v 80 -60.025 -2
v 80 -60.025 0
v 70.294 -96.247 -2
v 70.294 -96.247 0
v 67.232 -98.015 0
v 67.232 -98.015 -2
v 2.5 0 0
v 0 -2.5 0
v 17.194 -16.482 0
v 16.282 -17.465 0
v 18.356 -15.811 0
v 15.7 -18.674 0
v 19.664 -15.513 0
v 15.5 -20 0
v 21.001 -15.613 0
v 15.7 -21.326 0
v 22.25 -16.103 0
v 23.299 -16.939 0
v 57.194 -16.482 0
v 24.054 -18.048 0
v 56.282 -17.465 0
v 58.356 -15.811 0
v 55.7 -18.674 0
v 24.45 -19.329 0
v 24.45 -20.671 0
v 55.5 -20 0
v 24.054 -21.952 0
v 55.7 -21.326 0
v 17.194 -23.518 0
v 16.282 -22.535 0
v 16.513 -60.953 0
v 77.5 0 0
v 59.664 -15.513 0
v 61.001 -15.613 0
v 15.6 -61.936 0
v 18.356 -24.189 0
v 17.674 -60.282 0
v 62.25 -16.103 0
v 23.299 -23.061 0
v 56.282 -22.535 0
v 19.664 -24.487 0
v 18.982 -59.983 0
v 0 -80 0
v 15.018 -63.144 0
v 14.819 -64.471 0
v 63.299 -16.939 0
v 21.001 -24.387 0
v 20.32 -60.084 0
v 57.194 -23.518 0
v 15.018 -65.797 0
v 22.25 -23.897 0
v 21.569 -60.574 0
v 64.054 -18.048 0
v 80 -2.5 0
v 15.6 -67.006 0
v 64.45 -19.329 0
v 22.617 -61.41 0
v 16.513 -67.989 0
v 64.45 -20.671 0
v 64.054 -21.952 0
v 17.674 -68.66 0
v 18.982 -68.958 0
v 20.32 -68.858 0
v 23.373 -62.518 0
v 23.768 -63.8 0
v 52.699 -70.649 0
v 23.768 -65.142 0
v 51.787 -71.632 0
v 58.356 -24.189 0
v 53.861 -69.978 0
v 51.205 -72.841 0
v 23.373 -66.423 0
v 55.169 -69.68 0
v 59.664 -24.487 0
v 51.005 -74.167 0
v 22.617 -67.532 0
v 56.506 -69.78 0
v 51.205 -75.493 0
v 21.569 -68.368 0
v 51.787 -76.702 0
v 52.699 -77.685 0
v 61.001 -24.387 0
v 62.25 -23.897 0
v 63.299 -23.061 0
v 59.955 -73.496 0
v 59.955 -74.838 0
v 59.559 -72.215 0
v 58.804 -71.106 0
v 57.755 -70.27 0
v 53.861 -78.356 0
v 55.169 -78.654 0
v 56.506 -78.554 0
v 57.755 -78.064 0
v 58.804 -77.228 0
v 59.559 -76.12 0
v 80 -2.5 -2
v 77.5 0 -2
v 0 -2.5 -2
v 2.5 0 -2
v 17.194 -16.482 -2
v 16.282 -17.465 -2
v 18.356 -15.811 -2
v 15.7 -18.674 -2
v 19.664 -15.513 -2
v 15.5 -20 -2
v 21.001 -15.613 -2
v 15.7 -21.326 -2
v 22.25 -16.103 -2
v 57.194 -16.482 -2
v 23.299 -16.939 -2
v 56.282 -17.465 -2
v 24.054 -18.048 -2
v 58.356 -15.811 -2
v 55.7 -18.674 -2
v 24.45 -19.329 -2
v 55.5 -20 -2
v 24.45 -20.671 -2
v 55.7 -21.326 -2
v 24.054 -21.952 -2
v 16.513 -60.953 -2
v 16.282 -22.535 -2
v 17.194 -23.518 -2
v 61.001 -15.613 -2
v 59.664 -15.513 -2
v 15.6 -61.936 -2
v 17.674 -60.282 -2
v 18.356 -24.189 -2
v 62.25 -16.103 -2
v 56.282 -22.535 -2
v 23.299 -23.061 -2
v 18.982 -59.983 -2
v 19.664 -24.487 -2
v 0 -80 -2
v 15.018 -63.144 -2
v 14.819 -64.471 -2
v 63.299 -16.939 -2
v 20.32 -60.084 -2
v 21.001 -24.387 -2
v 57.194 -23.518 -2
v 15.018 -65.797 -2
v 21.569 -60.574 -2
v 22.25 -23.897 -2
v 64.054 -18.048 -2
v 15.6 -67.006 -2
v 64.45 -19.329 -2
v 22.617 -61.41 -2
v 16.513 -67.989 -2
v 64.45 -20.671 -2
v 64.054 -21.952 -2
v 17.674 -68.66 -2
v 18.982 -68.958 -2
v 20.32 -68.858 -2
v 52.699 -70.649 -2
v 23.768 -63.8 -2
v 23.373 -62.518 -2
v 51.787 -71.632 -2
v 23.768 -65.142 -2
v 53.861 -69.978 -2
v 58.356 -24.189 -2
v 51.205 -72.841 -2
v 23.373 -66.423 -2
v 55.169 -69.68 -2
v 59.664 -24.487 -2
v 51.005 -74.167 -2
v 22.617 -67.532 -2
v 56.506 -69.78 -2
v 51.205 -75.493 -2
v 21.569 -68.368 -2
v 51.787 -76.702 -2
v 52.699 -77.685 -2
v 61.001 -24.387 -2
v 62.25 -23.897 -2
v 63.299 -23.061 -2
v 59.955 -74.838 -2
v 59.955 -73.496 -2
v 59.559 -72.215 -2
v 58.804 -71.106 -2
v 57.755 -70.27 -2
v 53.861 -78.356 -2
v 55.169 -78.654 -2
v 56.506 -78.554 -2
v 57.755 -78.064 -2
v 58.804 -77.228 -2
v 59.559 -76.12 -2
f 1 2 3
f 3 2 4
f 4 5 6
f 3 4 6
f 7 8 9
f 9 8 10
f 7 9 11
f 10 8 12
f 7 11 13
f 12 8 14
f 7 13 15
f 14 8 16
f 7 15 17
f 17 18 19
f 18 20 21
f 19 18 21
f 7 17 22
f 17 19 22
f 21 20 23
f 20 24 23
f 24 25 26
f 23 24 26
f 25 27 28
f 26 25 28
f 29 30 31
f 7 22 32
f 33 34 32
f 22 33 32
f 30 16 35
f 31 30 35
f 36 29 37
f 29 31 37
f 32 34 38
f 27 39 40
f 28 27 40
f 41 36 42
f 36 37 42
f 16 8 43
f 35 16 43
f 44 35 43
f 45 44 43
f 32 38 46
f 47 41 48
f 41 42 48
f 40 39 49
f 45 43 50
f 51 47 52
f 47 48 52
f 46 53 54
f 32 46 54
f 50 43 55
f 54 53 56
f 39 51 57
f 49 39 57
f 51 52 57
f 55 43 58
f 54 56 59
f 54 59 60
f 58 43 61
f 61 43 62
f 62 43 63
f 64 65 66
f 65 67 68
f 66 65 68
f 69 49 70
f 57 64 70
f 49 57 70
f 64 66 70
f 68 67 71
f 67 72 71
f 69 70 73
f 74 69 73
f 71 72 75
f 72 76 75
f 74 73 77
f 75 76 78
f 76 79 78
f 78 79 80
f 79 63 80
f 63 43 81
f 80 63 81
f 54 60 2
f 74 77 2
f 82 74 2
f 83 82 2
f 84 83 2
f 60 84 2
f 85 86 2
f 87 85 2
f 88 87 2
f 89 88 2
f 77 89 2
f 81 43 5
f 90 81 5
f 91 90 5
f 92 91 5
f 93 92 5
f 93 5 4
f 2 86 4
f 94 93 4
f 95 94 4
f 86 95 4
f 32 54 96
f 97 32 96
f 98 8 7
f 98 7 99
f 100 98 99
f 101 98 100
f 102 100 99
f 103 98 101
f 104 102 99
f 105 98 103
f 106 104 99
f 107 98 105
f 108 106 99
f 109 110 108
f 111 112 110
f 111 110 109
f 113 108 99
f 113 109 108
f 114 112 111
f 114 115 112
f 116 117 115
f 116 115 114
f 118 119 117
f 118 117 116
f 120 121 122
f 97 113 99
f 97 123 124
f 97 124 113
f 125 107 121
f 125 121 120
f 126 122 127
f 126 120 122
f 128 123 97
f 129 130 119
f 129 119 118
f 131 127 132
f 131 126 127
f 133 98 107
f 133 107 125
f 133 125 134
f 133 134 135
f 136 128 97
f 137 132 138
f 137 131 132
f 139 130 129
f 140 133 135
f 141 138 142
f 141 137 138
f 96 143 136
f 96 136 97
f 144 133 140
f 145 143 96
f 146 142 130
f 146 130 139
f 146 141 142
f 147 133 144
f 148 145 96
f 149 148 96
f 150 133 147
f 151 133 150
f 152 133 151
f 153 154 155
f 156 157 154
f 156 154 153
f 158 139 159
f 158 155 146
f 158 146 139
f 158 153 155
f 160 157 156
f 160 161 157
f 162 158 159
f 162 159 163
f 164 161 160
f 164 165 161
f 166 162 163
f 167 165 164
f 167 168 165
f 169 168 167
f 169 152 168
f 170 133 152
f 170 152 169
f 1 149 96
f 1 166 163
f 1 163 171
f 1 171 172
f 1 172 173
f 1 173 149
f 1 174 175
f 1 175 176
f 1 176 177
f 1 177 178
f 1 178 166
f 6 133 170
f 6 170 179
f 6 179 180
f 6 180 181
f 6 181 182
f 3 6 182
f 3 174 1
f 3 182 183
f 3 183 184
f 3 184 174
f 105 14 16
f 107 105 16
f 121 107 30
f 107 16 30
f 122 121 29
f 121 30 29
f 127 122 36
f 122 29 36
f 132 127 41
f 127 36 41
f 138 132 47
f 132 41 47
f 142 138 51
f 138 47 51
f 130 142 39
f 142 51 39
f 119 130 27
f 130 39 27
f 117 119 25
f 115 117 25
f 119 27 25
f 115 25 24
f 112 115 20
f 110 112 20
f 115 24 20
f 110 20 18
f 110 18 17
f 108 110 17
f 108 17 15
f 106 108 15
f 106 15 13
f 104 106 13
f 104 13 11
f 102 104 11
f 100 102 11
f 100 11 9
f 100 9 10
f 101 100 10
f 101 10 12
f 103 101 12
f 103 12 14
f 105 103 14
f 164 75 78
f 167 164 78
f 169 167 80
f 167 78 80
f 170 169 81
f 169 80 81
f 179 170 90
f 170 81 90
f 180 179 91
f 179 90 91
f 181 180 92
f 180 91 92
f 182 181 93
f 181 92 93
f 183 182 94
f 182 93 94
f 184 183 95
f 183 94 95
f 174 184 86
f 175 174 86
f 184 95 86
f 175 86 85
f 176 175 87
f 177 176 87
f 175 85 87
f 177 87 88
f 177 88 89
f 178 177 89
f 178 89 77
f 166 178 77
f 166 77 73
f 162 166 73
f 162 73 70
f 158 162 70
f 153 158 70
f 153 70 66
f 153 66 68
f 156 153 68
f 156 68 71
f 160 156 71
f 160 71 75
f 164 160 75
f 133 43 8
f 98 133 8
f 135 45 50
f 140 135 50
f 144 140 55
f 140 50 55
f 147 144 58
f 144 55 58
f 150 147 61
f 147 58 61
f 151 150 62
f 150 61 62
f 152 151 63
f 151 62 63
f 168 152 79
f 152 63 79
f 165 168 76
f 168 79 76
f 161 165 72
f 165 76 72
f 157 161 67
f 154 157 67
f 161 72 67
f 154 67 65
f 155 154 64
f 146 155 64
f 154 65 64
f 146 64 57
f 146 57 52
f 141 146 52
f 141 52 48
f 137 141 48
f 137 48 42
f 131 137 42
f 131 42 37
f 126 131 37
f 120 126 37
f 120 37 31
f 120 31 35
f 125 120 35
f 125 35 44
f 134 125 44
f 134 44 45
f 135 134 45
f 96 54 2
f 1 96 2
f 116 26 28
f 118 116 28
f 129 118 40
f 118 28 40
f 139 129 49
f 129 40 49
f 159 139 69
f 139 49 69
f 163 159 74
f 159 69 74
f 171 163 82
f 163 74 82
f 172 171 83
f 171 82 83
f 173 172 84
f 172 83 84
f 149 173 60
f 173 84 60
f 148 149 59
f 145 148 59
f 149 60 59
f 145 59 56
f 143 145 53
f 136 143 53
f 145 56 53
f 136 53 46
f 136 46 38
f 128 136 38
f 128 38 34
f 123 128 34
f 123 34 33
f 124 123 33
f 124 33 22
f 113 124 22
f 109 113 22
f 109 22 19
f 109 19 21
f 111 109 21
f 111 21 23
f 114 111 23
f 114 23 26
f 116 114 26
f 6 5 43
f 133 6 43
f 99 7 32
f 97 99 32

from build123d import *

# Parameters (mm, degrees)
EXTRUDE_1_DEPTH   = 2
HOLE_WIZARD_M81_D = 9
CHAMFER_1_SIZE    = 2.5


with BuildPart() as part:
    # Эскиз3 → Бобышка-Вытянуть1 (new body)
    with BuildSketch(Plane(origin=(0, 0, 0), x_dir=(1, 0, 0), z_dir=(0, 0, -1))):
        Polygon((0, 0), (80, 0), (80, 60.024888178), (69.647238196, 98.66192123), (0, 80), align=None)
    extrude(amount=EXTRUDE_1_DEPTH)

    # Отверстие с зазором M81 (through all)
    with Locations(Plane(origin=(0, 0, -2), x_dir=(1, 0, 0), z_dir=(0, 0, -1))):
        with Locations((20, 20), (60, 20), (19.318516526, 64.470857294), (55.505102572, 74.167023802)):
            Hole(HOLE_WIZARD_M81_D / 2)

    # Фаска1
    chamfer_1_edges = [part.edges().sort_by_distance(p)[0] for p in [
        (69.647238196, -98.66192123, -1),
        (80, 0, -1),
        (0, 0, -1),
    ]]
    chamfer(chamfer_1_edges, length=CHAMFER_1_SIZE)


solid = part.part
